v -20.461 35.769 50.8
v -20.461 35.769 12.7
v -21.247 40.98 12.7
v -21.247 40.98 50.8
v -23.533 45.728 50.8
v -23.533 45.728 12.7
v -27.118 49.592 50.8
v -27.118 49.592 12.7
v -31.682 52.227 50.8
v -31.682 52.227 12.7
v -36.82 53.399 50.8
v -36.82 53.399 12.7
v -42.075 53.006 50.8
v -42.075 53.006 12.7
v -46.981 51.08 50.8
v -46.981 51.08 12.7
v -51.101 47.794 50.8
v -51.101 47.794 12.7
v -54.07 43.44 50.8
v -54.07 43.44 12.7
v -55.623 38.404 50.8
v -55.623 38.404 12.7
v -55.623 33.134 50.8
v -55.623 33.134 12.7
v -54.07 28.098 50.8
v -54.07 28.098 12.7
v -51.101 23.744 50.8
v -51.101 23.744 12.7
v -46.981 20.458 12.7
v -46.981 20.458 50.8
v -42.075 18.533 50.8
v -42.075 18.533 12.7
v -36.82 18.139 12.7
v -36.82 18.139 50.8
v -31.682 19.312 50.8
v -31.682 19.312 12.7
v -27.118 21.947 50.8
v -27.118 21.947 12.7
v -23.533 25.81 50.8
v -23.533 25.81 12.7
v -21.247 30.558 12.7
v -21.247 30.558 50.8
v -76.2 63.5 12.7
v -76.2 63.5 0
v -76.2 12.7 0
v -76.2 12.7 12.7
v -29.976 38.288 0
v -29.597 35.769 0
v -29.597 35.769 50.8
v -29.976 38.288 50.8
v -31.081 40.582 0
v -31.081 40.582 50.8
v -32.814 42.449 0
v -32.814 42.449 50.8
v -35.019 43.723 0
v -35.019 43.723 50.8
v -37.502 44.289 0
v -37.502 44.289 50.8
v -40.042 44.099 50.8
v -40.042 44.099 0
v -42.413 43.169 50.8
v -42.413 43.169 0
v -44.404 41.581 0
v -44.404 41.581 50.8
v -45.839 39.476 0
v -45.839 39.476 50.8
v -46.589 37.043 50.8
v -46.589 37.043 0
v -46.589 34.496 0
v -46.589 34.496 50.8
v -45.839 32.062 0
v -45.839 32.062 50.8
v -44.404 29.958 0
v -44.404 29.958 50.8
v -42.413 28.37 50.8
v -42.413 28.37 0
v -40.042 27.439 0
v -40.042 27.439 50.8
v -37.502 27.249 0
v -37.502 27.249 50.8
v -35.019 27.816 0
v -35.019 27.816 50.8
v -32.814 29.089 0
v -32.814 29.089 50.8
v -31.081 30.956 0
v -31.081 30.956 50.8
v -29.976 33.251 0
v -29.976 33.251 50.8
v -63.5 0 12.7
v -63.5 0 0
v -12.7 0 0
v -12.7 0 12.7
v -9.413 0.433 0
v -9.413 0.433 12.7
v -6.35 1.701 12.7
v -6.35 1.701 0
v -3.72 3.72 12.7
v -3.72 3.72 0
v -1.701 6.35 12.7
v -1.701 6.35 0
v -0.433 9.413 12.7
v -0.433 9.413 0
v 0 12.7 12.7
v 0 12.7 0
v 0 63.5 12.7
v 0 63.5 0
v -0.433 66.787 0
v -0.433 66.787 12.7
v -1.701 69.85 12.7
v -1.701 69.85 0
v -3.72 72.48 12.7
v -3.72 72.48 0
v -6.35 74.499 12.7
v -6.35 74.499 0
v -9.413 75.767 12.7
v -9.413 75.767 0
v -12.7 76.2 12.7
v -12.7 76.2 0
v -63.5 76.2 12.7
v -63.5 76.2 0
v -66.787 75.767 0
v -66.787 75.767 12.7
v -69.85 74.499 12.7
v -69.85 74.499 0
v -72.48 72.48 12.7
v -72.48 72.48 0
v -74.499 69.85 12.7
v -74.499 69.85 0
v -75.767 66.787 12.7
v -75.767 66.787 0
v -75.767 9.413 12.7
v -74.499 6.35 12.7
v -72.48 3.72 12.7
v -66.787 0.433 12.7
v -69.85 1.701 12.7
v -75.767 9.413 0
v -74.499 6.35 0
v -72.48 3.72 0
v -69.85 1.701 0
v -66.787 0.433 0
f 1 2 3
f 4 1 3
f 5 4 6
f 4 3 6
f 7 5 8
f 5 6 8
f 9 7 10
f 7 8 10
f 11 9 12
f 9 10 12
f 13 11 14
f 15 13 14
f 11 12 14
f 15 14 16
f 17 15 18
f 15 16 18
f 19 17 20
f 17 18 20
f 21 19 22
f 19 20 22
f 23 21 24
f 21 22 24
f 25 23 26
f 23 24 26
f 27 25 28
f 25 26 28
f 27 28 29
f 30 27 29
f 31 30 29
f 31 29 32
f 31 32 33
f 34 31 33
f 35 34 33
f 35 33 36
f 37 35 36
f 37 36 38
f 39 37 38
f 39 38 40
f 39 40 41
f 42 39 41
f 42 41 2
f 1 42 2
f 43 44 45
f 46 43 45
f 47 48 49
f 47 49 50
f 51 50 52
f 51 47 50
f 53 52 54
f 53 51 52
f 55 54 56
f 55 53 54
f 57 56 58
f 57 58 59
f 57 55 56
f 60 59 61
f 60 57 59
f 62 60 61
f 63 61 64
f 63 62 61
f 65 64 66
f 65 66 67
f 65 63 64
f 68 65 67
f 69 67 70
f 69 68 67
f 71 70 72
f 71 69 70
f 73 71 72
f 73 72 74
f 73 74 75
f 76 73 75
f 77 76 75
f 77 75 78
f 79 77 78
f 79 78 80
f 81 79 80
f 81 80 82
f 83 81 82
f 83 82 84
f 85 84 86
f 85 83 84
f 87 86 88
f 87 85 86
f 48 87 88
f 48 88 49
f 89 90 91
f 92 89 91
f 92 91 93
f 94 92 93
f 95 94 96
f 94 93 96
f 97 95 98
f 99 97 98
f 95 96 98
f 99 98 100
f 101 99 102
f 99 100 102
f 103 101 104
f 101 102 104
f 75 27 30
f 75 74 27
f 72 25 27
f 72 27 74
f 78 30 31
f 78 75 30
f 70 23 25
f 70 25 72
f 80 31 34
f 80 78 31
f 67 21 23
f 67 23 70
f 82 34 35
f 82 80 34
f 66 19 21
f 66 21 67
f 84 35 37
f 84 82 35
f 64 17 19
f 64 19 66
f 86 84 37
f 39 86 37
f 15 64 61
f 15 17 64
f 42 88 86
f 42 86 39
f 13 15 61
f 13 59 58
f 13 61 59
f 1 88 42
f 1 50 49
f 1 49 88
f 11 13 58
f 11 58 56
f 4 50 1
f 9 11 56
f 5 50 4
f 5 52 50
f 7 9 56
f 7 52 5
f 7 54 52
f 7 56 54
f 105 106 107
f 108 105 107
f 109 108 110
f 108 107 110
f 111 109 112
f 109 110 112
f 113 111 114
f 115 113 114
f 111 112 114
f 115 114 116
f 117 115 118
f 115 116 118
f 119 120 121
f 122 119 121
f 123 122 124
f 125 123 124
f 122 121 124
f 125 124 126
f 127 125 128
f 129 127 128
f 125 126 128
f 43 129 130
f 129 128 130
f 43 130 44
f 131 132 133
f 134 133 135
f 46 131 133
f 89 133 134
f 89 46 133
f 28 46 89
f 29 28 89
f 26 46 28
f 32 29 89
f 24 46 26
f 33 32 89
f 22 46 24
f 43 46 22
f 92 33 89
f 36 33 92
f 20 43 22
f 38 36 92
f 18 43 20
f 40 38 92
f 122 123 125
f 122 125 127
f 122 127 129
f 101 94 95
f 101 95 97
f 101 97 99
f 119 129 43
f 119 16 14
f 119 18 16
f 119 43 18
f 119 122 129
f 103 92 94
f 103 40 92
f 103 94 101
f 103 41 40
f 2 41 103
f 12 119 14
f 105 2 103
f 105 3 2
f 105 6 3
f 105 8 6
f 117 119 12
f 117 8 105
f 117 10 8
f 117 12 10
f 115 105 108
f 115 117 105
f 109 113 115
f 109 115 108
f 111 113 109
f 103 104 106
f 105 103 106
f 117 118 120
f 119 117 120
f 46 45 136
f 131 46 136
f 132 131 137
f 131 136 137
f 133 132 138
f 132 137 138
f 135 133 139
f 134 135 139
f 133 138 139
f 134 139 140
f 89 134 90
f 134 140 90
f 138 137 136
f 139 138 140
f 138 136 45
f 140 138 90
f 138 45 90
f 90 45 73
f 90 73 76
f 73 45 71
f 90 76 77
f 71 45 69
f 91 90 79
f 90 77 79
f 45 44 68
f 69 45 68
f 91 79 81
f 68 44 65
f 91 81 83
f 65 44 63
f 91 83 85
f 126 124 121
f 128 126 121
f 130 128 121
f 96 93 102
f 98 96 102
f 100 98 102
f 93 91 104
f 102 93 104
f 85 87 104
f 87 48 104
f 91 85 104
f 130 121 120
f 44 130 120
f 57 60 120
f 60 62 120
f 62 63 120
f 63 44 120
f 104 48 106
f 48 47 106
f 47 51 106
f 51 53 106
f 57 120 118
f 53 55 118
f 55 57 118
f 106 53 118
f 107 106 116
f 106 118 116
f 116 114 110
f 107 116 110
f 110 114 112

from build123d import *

# Parameters (mm, degrees)
F0_R     = 17.679544
F1_DEPTH = 12.7
F0_R_2   = 8.543995
F2_DEPTH = 50.8


with BuildPart() as f1:
    # F0 (on Top) → F1 (new body)
    with BuildSketch(Plane.XY):
        with BuildLine():
            Line((-63.5, 0), (-12.7, 0))
            ThreePointArc((-12.7, 0), (-3.719744, 3.719744), (0, 12.7))
            Line((0, 12.7), (0, 63.5))
            ThreePointArc((0, 63.5), (-3.719744, 72.480256), (-12.7, 76.2))
            Line((-12.7, 76.2), (-63.5, 76.2))
            ThreePointArc((-63.5, 76.2), (-72.480256, 72.480256), (-76.2, 63.5))
            Line((-76.2, 63.5), (-76.2, 12.7))
            ThreePointArc((-76.2, 12.7), (-72.480256, 3.719744), (-63.5, 0))
        make_face()
        with Locations((-38.140807, 35.769224)):
            Circle(F0_R, mode=Mode.SUBTRACT)
    extrude(amount=F1_DEPTH)

    # F0 (on Top) → F2 (join)
    with BuildSketch(Plane.XY):
        with Locations((-38.140807, 35.769224)):
            Circle(F0_R)
        with Locations((-38.140807, 35.769224)):
            Circle(F0_R_2, mode=Mode.SUBTRACT)
    extrude(amount=F2_DEPTH)


solid = f1.part
